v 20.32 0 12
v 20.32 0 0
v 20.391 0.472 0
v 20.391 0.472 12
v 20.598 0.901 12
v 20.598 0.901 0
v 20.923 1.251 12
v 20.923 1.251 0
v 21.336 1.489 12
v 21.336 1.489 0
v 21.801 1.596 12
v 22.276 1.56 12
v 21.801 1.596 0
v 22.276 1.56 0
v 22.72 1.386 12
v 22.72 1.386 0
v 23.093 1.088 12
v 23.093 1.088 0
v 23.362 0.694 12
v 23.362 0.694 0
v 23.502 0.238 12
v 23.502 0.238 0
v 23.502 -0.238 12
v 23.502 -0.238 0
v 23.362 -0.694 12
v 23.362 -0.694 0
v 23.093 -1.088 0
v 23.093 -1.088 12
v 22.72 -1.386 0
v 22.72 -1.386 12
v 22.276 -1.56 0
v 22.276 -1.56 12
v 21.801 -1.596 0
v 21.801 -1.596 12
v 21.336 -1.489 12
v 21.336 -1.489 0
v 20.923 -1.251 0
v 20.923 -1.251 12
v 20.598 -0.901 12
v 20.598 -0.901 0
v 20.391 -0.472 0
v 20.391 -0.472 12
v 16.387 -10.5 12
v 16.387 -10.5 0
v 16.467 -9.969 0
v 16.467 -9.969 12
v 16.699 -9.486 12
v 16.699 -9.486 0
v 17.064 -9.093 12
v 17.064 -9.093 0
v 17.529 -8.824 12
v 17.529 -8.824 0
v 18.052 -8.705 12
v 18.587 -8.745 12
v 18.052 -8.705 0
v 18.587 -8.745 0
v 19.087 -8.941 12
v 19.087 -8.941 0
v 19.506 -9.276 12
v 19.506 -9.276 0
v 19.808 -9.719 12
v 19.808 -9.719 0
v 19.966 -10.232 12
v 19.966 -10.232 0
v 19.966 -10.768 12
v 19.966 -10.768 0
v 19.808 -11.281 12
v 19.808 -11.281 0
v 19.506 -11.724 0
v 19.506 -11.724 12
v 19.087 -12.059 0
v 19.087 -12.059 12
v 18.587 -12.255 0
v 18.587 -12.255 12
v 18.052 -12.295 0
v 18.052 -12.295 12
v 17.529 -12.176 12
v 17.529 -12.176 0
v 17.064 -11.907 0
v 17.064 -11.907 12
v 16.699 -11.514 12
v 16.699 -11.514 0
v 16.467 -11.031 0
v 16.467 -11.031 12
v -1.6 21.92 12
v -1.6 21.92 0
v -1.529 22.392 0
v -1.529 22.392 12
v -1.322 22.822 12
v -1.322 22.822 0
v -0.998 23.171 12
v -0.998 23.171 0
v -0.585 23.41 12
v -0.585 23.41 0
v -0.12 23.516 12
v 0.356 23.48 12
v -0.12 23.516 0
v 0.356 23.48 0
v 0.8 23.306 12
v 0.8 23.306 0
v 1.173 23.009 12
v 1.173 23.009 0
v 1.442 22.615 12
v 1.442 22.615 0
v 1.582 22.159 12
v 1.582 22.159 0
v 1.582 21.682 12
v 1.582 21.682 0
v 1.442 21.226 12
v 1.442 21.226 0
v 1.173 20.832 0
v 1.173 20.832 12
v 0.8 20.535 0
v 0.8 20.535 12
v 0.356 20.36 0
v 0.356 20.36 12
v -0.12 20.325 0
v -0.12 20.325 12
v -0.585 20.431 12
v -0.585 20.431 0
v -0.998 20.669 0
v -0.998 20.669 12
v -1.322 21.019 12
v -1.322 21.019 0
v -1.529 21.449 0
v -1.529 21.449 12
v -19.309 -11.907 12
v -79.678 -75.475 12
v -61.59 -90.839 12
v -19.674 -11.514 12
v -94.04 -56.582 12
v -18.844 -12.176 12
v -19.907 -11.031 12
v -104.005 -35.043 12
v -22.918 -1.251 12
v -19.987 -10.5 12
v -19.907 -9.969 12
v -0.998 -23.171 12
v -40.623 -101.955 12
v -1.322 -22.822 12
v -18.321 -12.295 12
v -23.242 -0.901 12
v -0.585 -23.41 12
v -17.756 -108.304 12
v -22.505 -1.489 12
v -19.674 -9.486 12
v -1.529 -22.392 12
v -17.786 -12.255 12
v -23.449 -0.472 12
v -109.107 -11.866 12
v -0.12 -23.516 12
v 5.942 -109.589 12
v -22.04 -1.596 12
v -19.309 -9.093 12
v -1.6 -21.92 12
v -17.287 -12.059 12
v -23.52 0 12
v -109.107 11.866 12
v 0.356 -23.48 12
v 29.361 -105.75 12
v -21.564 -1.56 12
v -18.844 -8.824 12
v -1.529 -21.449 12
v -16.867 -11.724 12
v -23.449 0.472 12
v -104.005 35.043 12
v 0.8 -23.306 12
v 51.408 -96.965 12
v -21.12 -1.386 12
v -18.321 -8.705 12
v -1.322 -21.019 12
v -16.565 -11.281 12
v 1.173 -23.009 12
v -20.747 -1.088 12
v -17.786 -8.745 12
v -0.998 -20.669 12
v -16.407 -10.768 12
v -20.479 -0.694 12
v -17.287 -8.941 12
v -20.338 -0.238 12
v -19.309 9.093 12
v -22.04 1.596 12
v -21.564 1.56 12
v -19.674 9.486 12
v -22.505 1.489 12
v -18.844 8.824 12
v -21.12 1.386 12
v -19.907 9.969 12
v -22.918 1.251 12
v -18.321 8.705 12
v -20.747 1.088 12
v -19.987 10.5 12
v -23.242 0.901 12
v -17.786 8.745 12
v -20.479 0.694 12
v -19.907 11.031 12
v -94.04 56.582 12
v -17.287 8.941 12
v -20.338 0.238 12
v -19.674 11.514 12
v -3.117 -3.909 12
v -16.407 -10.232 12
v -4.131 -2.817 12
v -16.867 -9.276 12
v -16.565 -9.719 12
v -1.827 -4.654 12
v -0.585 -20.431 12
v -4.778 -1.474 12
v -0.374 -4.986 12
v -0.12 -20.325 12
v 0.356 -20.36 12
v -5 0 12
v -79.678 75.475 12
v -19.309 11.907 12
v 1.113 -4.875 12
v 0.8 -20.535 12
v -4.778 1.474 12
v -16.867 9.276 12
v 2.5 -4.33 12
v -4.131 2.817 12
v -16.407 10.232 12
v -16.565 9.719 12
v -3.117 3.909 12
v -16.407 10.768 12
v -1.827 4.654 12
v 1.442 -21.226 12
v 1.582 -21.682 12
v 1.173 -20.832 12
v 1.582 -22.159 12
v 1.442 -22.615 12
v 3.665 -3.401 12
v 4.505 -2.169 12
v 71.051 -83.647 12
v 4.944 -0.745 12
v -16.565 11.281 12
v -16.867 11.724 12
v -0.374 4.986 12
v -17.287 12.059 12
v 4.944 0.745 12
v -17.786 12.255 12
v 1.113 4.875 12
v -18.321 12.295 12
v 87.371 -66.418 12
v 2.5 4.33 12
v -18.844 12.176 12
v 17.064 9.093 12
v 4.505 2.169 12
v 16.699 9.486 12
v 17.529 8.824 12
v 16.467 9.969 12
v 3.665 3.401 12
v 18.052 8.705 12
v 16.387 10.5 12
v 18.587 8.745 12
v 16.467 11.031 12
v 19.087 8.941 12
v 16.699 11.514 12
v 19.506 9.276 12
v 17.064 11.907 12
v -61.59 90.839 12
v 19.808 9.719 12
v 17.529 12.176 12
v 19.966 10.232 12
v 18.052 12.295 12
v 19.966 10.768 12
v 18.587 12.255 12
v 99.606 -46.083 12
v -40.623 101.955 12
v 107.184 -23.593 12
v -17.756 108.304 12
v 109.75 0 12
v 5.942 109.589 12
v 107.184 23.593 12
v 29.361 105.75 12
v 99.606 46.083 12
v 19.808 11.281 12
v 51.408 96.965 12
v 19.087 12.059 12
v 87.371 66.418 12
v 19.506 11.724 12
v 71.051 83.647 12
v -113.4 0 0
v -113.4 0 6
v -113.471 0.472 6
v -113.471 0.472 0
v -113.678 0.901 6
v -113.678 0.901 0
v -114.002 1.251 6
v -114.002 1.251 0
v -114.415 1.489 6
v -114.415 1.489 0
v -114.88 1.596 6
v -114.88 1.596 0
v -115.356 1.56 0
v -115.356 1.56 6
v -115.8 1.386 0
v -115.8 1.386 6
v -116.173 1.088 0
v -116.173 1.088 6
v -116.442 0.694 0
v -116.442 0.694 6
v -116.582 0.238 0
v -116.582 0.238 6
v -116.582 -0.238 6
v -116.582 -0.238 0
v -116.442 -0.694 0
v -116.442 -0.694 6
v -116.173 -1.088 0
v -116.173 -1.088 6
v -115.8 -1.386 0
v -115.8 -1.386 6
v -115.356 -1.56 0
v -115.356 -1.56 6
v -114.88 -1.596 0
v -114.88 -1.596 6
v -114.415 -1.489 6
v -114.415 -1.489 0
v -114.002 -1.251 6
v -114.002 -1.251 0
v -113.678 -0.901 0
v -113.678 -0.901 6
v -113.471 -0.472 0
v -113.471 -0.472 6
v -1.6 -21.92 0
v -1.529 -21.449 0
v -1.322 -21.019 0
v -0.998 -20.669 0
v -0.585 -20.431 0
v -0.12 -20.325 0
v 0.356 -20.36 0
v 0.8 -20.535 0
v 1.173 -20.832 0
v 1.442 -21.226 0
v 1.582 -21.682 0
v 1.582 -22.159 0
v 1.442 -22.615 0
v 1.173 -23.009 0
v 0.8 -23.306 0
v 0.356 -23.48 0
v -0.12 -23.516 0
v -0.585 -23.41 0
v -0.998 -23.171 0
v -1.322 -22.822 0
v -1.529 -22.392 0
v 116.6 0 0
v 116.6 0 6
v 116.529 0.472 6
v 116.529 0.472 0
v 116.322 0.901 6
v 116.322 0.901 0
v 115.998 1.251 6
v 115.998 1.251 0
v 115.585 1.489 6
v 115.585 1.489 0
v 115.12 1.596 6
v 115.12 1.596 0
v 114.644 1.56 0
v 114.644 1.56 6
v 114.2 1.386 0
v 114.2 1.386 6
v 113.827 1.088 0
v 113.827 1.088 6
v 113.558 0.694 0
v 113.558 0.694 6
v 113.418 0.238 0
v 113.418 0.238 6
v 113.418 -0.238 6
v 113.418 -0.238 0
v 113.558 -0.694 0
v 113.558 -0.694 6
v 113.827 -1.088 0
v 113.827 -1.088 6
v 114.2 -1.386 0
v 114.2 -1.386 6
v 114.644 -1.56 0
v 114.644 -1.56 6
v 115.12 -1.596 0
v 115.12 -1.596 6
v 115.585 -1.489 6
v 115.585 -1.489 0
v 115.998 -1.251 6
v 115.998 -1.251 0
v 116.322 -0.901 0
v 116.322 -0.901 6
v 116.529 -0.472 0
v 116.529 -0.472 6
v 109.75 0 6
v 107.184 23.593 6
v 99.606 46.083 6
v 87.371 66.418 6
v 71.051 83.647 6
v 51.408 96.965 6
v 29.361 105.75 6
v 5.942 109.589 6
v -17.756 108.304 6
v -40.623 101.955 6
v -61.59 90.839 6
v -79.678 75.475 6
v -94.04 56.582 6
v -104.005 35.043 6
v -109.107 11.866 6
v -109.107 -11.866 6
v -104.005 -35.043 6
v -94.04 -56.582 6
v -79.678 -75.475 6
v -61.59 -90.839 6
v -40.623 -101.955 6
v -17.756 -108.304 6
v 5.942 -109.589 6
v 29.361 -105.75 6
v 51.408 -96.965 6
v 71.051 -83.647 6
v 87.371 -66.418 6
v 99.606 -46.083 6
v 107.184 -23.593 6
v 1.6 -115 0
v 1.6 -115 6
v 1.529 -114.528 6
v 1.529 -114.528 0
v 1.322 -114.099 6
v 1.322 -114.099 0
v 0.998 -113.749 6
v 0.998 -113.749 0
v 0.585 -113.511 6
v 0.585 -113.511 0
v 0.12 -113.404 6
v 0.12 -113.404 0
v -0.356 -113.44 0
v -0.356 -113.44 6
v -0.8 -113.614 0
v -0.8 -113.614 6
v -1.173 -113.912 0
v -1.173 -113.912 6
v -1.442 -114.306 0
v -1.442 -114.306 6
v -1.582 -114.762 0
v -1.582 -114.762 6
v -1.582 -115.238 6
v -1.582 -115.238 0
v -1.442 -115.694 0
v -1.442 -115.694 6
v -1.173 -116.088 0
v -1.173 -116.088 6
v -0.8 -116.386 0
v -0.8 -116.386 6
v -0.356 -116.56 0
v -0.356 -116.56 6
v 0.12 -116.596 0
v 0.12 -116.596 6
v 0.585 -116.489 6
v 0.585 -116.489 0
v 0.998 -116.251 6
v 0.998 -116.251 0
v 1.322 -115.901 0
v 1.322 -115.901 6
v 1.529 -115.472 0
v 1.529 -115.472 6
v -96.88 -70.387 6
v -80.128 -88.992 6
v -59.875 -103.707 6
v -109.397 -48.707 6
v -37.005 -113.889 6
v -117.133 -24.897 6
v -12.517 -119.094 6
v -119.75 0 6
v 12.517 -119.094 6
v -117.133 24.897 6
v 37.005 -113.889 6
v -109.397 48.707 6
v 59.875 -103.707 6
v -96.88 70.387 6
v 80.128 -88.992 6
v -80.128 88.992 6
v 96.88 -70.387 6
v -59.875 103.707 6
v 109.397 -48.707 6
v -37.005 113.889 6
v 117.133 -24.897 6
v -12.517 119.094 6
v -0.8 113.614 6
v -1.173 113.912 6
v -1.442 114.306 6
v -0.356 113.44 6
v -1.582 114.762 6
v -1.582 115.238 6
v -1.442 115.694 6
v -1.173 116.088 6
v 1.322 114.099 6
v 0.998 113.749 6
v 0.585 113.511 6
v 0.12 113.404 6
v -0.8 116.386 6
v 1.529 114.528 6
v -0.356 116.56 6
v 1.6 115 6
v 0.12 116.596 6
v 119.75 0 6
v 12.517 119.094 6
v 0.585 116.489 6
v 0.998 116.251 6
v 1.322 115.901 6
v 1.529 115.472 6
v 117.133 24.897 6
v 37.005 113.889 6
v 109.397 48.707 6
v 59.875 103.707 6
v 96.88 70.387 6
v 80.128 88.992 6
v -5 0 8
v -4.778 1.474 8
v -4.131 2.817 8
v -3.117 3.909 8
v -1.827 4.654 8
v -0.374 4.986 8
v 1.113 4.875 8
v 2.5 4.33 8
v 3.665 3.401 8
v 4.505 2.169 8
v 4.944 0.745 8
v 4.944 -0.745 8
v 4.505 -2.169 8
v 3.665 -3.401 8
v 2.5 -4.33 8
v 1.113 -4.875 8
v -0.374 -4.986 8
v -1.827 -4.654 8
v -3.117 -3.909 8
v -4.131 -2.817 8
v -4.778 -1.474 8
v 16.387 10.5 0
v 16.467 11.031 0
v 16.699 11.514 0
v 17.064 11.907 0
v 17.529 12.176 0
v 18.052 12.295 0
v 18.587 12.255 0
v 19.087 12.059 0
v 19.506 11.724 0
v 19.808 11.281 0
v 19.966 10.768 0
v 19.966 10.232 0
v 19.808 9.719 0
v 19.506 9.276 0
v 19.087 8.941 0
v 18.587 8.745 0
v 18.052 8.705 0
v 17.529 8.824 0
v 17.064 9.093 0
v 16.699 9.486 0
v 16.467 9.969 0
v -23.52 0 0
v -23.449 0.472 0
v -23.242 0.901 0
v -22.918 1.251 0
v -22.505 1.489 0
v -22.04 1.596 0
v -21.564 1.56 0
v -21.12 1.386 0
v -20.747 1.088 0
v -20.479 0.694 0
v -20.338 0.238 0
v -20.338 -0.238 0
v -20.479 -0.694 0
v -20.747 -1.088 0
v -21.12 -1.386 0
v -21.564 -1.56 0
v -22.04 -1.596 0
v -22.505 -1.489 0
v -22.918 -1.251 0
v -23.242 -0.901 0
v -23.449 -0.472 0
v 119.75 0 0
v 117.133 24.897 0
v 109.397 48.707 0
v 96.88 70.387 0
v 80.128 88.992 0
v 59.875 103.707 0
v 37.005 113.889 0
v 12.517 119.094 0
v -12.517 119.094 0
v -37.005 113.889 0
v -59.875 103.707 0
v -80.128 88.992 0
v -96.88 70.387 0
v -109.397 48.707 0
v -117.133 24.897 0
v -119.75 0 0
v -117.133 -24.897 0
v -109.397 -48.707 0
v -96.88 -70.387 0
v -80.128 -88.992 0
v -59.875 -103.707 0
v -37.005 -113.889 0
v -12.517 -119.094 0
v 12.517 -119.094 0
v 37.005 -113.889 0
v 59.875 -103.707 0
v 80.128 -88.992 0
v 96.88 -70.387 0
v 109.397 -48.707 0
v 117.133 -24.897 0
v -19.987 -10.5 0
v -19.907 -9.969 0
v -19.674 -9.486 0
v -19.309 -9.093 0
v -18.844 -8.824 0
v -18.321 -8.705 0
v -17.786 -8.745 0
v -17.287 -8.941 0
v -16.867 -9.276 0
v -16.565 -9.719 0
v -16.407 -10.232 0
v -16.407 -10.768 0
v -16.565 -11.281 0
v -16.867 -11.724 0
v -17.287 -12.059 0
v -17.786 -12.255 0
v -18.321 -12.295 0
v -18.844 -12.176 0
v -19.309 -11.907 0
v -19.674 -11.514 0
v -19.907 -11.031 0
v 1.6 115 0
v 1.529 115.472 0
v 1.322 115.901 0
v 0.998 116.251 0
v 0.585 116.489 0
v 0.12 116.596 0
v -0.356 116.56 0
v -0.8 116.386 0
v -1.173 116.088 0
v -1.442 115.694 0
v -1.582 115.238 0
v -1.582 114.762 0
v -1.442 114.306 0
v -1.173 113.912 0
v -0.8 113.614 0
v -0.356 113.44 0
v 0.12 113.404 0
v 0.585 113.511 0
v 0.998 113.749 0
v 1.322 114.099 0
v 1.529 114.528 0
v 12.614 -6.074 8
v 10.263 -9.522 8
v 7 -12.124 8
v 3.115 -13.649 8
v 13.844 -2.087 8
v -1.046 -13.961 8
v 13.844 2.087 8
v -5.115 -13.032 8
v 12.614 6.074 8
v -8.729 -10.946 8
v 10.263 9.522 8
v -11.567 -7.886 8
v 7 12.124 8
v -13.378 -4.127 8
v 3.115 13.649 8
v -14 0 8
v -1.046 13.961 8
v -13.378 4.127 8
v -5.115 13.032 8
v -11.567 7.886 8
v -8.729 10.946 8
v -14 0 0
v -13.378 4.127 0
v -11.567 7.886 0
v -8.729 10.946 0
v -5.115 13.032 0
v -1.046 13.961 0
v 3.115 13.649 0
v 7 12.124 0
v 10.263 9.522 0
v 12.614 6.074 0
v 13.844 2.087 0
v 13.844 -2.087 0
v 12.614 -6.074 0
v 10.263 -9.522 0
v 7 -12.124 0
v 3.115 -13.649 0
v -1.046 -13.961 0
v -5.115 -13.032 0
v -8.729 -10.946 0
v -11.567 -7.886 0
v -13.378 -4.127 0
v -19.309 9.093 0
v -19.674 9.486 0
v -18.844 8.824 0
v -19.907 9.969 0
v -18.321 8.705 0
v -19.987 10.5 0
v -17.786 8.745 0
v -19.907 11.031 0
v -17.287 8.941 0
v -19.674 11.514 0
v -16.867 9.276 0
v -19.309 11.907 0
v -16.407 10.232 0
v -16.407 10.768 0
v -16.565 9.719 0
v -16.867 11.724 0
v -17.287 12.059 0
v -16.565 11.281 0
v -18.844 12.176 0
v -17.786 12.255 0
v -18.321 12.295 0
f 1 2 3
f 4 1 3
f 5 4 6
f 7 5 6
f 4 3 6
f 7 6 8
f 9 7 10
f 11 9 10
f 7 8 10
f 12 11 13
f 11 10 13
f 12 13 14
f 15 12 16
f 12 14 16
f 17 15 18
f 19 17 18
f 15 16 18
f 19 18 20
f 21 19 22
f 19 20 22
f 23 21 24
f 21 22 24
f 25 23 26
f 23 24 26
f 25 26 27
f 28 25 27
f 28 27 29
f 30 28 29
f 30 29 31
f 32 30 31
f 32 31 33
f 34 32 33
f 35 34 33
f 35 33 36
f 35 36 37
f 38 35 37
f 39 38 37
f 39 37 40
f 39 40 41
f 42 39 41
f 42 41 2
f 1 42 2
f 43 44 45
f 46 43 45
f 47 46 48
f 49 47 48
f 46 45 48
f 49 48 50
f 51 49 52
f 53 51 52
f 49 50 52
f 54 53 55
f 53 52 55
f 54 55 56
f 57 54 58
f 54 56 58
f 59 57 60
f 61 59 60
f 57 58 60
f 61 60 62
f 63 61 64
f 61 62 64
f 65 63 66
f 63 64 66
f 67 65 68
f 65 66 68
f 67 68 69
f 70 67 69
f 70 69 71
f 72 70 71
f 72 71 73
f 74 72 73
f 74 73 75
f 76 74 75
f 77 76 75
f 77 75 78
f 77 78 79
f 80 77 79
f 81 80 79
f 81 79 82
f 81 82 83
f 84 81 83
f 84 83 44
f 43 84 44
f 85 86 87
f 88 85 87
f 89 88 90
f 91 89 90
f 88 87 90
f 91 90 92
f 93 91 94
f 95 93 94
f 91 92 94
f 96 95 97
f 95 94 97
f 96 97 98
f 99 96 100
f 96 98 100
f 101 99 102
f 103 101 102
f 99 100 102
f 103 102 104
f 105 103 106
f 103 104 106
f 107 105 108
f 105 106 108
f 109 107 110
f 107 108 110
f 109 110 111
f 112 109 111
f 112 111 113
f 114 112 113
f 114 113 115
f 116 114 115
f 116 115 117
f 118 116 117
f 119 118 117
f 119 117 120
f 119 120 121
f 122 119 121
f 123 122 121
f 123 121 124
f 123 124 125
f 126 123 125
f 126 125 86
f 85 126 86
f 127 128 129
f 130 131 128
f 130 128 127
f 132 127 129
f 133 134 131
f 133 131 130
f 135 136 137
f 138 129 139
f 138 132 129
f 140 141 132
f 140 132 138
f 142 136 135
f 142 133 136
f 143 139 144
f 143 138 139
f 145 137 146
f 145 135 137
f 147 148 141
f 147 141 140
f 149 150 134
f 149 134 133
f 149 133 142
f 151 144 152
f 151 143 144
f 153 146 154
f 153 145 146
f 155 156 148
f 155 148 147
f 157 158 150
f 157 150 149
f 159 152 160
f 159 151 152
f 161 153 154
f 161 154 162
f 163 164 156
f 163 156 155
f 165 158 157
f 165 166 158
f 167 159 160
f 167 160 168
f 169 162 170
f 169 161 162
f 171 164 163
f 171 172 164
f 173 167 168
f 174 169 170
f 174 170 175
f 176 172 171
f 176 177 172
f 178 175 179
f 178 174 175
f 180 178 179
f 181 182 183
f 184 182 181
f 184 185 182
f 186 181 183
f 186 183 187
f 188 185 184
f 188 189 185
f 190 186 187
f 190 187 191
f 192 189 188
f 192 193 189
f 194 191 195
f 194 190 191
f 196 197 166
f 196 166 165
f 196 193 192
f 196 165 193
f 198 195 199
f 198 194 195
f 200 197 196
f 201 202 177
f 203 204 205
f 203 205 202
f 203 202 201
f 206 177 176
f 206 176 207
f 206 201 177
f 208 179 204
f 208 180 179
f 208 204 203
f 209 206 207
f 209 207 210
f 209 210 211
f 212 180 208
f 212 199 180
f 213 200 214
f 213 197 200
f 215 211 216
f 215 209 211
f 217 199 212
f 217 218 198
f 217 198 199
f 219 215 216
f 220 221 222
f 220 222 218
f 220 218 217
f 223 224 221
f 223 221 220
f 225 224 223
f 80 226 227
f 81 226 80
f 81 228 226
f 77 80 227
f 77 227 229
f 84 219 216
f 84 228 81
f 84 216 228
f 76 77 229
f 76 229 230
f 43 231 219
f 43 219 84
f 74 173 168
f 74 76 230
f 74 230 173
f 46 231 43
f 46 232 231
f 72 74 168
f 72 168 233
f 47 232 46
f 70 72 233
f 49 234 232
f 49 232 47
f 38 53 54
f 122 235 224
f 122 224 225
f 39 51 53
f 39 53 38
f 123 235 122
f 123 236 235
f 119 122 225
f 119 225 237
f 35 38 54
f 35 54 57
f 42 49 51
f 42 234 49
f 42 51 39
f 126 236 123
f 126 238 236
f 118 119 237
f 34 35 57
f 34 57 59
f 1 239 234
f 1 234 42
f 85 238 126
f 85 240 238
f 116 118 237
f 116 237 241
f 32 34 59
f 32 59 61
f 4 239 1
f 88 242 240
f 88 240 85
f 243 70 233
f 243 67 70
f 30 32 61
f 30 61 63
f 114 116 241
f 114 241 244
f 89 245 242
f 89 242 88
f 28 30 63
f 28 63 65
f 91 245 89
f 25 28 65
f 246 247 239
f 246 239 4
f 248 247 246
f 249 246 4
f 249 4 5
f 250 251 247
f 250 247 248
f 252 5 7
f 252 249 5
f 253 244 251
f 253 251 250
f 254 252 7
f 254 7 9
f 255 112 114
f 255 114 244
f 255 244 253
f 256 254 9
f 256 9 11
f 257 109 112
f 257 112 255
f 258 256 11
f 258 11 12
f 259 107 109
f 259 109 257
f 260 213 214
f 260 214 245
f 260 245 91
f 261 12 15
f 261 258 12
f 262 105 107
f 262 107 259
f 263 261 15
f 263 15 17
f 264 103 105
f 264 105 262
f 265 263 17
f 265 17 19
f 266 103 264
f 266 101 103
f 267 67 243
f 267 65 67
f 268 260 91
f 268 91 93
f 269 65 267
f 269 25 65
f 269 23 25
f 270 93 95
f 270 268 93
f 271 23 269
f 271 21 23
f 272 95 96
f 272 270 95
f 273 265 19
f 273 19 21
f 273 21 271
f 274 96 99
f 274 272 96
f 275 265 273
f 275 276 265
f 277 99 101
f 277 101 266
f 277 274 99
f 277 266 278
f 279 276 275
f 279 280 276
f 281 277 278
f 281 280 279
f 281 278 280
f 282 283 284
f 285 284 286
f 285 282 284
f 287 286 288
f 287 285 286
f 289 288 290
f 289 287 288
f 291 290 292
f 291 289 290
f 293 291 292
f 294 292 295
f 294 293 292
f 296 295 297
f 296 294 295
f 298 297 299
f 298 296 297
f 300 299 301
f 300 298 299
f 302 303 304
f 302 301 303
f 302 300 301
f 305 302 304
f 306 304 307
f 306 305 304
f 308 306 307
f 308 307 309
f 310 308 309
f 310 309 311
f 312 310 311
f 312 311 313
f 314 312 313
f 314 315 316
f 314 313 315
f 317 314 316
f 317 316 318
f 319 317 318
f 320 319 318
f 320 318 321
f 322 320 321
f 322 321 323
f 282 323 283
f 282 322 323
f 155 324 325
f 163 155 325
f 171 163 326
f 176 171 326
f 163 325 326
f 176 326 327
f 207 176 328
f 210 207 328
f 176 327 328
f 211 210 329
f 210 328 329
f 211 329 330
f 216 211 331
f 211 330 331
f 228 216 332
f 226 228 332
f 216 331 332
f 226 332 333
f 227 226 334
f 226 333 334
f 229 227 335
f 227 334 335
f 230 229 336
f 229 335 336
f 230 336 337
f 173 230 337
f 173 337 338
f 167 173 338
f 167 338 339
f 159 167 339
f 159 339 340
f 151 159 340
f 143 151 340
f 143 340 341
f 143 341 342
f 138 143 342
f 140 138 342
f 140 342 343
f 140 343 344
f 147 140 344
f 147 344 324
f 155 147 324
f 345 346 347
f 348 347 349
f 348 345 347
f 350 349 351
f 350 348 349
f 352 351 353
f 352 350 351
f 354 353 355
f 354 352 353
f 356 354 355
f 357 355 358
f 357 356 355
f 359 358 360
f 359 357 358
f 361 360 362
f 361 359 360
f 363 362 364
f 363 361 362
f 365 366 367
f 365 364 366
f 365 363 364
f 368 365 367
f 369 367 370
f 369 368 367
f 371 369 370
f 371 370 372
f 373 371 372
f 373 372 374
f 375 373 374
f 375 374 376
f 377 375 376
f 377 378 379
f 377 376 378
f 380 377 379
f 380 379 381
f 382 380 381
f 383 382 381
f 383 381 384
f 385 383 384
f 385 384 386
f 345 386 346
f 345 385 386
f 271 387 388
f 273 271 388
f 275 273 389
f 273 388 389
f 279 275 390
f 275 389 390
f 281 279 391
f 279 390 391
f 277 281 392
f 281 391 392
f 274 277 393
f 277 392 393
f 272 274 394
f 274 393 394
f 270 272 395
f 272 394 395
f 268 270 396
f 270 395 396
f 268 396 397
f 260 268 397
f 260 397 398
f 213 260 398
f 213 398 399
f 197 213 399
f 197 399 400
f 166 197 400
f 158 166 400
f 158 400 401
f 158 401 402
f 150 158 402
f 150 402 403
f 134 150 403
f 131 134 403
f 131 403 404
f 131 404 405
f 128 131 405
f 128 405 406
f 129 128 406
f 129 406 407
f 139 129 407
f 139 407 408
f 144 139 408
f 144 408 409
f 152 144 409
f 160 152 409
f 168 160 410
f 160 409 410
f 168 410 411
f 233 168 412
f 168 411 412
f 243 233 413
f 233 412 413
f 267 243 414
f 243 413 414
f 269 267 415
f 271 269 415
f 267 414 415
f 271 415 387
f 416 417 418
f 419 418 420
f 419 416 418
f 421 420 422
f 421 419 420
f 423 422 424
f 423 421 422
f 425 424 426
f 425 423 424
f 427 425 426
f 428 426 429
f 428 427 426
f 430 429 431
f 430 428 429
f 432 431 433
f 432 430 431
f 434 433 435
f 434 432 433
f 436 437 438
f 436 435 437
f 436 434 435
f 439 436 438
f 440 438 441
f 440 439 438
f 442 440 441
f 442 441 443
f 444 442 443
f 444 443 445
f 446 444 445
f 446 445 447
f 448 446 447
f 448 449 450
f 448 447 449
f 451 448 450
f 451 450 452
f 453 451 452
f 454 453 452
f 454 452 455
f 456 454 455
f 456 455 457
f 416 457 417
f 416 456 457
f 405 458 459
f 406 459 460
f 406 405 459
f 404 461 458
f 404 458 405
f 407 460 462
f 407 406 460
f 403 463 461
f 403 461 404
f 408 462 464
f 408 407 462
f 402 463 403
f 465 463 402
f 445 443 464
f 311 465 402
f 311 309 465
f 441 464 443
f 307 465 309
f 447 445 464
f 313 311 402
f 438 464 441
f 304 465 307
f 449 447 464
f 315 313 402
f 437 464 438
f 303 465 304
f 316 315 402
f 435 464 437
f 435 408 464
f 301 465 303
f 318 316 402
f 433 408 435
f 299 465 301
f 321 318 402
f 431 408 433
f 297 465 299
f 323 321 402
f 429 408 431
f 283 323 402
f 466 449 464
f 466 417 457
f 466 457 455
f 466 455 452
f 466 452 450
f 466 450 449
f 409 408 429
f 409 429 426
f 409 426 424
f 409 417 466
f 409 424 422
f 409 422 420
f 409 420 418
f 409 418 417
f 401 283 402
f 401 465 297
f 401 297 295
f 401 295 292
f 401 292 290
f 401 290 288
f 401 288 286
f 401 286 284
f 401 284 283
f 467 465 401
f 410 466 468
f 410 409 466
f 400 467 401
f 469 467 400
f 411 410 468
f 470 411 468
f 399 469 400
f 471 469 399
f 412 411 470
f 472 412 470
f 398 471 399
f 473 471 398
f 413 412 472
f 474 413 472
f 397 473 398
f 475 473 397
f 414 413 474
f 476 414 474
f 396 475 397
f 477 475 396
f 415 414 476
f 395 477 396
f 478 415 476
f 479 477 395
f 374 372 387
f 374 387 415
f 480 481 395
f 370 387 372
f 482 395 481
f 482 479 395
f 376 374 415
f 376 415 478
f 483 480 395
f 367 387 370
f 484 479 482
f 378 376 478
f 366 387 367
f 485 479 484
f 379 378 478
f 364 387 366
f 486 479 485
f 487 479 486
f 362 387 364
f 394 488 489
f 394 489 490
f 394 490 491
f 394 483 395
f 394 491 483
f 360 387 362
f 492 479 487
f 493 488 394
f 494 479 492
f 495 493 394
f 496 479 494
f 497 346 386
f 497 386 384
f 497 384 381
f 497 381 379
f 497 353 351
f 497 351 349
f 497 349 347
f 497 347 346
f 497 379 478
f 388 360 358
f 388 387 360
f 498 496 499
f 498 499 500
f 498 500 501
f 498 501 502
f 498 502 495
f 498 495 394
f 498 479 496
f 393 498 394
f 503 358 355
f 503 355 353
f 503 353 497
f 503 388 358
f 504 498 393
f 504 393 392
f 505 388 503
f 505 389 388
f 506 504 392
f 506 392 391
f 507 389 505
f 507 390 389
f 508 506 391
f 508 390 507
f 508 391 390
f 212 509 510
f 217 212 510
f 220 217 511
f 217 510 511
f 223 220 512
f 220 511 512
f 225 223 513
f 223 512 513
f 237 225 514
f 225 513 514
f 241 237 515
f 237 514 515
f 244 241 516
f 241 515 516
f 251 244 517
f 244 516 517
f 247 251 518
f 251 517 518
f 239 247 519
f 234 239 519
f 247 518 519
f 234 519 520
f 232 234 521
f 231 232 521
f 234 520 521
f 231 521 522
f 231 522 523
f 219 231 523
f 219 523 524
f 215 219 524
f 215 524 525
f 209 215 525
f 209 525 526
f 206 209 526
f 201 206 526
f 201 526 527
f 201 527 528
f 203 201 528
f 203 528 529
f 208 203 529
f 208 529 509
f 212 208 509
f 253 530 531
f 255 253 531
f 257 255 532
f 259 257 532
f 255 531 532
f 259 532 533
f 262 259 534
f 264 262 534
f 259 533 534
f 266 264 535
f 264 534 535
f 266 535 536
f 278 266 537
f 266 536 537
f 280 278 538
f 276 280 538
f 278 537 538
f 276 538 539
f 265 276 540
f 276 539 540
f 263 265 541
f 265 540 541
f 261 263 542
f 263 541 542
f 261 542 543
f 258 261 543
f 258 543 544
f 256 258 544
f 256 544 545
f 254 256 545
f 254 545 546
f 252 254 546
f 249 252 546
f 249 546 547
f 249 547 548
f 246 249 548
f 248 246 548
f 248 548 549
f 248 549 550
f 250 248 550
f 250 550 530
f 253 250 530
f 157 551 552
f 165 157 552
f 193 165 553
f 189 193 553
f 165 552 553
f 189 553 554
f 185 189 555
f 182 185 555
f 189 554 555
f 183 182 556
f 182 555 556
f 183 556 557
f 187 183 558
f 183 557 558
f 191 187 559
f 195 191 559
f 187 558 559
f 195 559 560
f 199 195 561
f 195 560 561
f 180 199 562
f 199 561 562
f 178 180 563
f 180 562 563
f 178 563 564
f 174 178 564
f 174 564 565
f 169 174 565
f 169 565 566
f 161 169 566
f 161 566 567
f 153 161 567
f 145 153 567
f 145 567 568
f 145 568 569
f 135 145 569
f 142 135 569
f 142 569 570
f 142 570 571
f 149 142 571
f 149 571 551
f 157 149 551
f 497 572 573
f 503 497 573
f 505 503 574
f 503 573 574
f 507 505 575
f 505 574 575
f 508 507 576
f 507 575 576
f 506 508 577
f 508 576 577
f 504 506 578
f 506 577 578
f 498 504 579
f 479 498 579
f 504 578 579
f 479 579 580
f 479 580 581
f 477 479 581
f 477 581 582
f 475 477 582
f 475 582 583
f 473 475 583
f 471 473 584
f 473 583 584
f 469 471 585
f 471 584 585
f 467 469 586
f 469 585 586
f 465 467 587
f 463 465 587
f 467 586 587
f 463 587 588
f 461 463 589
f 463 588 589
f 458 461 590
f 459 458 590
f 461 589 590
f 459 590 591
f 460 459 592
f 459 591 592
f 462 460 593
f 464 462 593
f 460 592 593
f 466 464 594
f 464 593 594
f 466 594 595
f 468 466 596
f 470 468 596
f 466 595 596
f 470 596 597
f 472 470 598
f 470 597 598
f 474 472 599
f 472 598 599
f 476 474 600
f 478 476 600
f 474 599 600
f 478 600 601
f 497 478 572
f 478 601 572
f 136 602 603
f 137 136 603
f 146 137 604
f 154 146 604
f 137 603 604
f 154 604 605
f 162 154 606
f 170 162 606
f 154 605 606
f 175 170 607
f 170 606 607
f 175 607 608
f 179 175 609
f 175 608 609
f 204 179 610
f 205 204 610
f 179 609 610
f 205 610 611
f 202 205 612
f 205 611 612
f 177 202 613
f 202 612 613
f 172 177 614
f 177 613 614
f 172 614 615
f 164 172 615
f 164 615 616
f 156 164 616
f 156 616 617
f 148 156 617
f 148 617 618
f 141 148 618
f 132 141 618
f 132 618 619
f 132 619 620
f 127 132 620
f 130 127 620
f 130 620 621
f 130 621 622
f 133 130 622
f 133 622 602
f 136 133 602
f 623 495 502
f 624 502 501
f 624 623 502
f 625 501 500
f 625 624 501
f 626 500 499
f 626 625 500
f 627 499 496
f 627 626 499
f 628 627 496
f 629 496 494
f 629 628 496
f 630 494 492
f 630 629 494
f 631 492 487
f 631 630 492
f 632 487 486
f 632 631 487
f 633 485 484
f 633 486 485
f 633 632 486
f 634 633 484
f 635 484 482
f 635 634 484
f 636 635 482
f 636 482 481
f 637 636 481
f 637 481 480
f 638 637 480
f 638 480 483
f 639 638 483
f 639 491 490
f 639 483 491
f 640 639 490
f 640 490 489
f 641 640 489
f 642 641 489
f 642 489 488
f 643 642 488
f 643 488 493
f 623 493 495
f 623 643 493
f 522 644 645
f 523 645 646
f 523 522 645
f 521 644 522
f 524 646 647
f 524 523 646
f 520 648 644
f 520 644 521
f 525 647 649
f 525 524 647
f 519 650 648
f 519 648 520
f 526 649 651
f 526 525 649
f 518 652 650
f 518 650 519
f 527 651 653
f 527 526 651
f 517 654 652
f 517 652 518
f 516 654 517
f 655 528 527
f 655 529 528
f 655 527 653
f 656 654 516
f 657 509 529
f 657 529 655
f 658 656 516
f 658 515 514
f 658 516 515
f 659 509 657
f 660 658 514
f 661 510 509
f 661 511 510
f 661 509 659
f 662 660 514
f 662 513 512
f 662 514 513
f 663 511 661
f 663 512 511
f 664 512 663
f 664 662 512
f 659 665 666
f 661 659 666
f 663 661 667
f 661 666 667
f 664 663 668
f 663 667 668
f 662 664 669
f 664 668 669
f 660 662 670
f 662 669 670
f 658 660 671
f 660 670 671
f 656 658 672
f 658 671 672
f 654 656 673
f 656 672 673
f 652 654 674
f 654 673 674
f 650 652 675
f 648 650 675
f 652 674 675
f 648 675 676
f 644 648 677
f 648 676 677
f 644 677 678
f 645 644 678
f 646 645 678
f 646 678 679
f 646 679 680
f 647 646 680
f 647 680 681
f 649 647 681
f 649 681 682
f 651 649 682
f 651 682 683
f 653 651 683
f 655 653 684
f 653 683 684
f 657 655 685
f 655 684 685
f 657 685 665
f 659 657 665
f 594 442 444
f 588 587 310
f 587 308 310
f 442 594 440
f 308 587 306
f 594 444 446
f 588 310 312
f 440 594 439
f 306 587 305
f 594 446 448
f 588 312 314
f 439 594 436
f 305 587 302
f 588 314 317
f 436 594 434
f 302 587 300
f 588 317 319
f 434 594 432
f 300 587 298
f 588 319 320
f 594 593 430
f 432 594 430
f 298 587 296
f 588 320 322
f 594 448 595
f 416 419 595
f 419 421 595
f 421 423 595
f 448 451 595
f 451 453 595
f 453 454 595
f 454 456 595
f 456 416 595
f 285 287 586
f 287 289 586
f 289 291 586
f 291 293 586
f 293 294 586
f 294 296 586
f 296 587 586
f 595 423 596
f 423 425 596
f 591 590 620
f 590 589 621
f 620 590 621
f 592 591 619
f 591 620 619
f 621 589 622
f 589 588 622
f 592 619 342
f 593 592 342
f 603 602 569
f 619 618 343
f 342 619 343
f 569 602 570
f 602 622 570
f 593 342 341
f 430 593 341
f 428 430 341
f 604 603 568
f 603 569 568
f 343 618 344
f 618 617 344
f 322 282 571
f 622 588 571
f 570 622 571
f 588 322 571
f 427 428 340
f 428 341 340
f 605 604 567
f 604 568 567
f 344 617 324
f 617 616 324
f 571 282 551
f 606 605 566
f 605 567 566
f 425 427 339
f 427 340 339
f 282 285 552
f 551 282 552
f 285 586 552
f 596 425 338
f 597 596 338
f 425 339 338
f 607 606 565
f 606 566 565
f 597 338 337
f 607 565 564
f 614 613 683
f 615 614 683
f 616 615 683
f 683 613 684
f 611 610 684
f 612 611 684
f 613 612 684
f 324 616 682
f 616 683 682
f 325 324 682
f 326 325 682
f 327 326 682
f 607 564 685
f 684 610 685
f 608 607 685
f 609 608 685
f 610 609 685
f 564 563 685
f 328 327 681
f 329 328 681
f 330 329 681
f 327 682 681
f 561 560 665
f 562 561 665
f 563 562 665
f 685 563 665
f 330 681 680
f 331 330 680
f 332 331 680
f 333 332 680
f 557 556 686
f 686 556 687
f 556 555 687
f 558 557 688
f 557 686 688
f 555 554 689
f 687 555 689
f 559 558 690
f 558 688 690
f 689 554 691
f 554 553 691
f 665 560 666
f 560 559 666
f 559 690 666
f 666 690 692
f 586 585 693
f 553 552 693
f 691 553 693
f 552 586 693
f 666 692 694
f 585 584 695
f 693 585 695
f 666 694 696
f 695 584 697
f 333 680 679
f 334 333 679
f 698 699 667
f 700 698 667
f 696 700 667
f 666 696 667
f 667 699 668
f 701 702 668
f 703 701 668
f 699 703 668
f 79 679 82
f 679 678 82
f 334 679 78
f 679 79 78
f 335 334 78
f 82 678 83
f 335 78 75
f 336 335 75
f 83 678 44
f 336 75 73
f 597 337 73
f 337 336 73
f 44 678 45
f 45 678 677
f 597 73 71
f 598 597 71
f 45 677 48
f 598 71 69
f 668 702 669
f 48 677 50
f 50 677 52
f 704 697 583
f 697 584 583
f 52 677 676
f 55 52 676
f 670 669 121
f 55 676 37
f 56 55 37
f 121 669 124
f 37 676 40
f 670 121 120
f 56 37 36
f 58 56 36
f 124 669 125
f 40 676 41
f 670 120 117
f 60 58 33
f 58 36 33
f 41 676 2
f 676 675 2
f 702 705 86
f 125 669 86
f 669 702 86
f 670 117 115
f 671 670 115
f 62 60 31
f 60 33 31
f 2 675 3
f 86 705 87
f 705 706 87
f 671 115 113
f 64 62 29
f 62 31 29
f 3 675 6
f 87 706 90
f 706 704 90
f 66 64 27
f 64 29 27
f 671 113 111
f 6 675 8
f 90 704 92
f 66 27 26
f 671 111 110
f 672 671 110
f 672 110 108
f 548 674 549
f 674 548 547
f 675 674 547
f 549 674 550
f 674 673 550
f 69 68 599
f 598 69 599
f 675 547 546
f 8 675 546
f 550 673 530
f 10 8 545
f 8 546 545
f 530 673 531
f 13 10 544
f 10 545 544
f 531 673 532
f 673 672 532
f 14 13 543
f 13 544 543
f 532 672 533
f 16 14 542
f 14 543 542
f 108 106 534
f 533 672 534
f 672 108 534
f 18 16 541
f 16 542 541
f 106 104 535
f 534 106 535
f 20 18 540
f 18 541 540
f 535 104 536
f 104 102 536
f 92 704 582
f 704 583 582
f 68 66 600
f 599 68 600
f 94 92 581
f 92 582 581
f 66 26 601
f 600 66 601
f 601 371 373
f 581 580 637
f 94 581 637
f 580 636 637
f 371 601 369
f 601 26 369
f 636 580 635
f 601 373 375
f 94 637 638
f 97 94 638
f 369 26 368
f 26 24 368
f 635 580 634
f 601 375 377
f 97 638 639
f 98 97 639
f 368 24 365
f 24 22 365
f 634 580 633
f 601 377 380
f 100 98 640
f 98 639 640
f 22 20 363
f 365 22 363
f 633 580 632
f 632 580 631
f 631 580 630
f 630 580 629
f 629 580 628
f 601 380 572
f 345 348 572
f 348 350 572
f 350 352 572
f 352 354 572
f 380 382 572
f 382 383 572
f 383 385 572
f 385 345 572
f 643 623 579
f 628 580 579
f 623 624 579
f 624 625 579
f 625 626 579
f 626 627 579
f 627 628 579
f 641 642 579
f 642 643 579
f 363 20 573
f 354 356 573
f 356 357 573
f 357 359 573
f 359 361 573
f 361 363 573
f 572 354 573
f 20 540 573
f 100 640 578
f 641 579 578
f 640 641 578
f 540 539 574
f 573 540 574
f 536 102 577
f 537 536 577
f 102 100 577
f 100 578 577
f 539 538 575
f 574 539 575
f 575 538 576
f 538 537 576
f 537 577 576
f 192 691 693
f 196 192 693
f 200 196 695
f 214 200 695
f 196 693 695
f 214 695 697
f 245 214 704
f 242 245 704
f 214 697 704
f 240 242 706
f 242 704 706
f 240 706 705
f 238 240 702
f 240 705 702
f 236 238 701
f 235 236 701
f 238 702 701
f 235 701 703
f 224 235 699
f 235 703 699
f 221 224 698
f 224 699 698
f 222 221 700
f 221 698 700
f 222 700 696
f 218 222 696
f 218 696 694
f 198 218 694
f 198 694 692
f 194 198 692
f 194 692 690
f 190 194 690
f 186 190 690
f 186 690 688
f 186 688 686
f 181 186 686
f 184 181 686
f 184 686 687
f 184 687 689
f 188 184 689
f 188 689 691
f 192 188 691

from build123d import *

# Parameters (mm, degrees)
SKETCH_1_R          = 109.75
EXTRUDE_1_DEPTH     = 12
SKETCH_2_R          = 119.75
EXTRUDE_2_DEPTH     = 6
SKETCH_3_R          = 1.6
CUT_EXTRUDE_1_DEPTH = 10
SKETCH_4_R          = 1.6
CUT_EXTRUDE_2_DEPTH = 20
SKETCH_4_5_R        = 1.6
CUT_EXTRUDE_3_DEPTH = 20
SKETCH_6_R          = 5
CUT_EXTRUDE_5_DEPTH = 20
SKETCH_7_R          = 1.8
CUT_EXTRUDE_8_DEPTH = 30
SKETCH_10_R         = 14
CUT_EXTRUDE_9_DEPTH = 8


with BuildPart() as part:
    # 草图1 → 凸台-拉伸1 (new body)
    with BuildSketch(Plane.XY):
        Circle(SKETCH_1_R)
    extrude(amount=EXTRUDE_1_DEPTH)

    # 草图2 → 凸台-拉伸2 (add)
    with BuildSketch(Plane.XY):
        Circle(SKETCH_2_R)
    extrude(amount=EXTRUDE_2_DEPTH)

    # 草图3 → 切除-拉伸1 (cut)
    with BuildSketch(Plane.XY):
        with Locations((-115, 0)):
            Circle(SKETCH_3_R)
        with Locations((115, 0)):
            Circle(SKETCH_3_R)
        with Locations((0, -115)):
            Circle(SKETCH_3_R)
        with Locations((0, 115)):
            Circle(SKETCH_3_R)
    extrude(amount=CUT_EXTRUDE_1_DEPTH, mode=Mode.SUBTRACT)

    # 草图4 → 切除-拉伸2 (cut)
    with BuildSketch(Plane(origin=(0, 0, 0), x_dir=(-1, 0, 0), z_dir=(0, 0, -1))):
        with Locations((0, -21.9203)):
            Circle(SKETCH_4_R)
    extrude(amount=-CUT_EXTRUDE_2_DEPTH, mode=Mode.SUBTRACT)

    # 草图4<5> → 切除-拉伸3 (cut)
    with BuildSketch(Plane(origin=(0, 0, 0), x_dir=(-1, 0, 0), z_dir=(0, 0, -1))):
        with Locations((-21.9203, 0)):
            Circle(SKETCH_4_5_R)
        with Locations((0, 21.9203)):
            Circle(SKETCH_4_5_R)
        with Locations((21.9203, 0)):
            Circle(SKETCH_4_5_R)
        with Locations((0, -21.9203)):
            Circle(SKETCH_4_5_R)
    extrude(amount=-CUT_EXTRUDE_3_DEPTH, mode=Mode.SUBTRACT)

    # 草图6 → 切除-拉伸5 (cut)
    with BuildSketch(Plane(origin=(0, 0, 0), x_dir=(-1, 0, 0), z_dir=(0, 0, -1))):
        Circle(SKETCH_6_R)
    extrude(amount=-CUT_EXTRUDE_5_DEPTH, mode=Mode.SUBTRACT)

    # 草图7 → 切除-拉伸8 (cut)
    with BuildSketch(Plane(origin=(0, 0, 0), x_dir=(-1, 0, 0), z_dir=(0, 0, -1))):
        with Locations((-18.186533479, 10.5)):
            Circle(SKETCH_7_R)
        with Locations((18.186533479, 10.5)):
            Circle(SKETCH_7_R)
        with Locations((18.186533479, -10.5)):
            Circle(SKETCH_7_R)
        with Locations((-18.186533479, -10.5)):
            Circle(SKETCH_7_R)
    extrude(amount=-CUT_EXTRUDE_8_DEPTH, mode=Mode.SUBTRACT)

    # 草图10 → 切除-拉伸9 (cut)
    with BuildSketch(Plane(origin=(0, 0, 0), x_dir=(-1, 0, 0), z_dir=(0, 0, -1))):
        Circle(SKETCH_10_R)
    extrude(amount=-CUT_EXTRUDE_9_DEPTH, mode=Mode.SUBTRACT)


solid = part.part
